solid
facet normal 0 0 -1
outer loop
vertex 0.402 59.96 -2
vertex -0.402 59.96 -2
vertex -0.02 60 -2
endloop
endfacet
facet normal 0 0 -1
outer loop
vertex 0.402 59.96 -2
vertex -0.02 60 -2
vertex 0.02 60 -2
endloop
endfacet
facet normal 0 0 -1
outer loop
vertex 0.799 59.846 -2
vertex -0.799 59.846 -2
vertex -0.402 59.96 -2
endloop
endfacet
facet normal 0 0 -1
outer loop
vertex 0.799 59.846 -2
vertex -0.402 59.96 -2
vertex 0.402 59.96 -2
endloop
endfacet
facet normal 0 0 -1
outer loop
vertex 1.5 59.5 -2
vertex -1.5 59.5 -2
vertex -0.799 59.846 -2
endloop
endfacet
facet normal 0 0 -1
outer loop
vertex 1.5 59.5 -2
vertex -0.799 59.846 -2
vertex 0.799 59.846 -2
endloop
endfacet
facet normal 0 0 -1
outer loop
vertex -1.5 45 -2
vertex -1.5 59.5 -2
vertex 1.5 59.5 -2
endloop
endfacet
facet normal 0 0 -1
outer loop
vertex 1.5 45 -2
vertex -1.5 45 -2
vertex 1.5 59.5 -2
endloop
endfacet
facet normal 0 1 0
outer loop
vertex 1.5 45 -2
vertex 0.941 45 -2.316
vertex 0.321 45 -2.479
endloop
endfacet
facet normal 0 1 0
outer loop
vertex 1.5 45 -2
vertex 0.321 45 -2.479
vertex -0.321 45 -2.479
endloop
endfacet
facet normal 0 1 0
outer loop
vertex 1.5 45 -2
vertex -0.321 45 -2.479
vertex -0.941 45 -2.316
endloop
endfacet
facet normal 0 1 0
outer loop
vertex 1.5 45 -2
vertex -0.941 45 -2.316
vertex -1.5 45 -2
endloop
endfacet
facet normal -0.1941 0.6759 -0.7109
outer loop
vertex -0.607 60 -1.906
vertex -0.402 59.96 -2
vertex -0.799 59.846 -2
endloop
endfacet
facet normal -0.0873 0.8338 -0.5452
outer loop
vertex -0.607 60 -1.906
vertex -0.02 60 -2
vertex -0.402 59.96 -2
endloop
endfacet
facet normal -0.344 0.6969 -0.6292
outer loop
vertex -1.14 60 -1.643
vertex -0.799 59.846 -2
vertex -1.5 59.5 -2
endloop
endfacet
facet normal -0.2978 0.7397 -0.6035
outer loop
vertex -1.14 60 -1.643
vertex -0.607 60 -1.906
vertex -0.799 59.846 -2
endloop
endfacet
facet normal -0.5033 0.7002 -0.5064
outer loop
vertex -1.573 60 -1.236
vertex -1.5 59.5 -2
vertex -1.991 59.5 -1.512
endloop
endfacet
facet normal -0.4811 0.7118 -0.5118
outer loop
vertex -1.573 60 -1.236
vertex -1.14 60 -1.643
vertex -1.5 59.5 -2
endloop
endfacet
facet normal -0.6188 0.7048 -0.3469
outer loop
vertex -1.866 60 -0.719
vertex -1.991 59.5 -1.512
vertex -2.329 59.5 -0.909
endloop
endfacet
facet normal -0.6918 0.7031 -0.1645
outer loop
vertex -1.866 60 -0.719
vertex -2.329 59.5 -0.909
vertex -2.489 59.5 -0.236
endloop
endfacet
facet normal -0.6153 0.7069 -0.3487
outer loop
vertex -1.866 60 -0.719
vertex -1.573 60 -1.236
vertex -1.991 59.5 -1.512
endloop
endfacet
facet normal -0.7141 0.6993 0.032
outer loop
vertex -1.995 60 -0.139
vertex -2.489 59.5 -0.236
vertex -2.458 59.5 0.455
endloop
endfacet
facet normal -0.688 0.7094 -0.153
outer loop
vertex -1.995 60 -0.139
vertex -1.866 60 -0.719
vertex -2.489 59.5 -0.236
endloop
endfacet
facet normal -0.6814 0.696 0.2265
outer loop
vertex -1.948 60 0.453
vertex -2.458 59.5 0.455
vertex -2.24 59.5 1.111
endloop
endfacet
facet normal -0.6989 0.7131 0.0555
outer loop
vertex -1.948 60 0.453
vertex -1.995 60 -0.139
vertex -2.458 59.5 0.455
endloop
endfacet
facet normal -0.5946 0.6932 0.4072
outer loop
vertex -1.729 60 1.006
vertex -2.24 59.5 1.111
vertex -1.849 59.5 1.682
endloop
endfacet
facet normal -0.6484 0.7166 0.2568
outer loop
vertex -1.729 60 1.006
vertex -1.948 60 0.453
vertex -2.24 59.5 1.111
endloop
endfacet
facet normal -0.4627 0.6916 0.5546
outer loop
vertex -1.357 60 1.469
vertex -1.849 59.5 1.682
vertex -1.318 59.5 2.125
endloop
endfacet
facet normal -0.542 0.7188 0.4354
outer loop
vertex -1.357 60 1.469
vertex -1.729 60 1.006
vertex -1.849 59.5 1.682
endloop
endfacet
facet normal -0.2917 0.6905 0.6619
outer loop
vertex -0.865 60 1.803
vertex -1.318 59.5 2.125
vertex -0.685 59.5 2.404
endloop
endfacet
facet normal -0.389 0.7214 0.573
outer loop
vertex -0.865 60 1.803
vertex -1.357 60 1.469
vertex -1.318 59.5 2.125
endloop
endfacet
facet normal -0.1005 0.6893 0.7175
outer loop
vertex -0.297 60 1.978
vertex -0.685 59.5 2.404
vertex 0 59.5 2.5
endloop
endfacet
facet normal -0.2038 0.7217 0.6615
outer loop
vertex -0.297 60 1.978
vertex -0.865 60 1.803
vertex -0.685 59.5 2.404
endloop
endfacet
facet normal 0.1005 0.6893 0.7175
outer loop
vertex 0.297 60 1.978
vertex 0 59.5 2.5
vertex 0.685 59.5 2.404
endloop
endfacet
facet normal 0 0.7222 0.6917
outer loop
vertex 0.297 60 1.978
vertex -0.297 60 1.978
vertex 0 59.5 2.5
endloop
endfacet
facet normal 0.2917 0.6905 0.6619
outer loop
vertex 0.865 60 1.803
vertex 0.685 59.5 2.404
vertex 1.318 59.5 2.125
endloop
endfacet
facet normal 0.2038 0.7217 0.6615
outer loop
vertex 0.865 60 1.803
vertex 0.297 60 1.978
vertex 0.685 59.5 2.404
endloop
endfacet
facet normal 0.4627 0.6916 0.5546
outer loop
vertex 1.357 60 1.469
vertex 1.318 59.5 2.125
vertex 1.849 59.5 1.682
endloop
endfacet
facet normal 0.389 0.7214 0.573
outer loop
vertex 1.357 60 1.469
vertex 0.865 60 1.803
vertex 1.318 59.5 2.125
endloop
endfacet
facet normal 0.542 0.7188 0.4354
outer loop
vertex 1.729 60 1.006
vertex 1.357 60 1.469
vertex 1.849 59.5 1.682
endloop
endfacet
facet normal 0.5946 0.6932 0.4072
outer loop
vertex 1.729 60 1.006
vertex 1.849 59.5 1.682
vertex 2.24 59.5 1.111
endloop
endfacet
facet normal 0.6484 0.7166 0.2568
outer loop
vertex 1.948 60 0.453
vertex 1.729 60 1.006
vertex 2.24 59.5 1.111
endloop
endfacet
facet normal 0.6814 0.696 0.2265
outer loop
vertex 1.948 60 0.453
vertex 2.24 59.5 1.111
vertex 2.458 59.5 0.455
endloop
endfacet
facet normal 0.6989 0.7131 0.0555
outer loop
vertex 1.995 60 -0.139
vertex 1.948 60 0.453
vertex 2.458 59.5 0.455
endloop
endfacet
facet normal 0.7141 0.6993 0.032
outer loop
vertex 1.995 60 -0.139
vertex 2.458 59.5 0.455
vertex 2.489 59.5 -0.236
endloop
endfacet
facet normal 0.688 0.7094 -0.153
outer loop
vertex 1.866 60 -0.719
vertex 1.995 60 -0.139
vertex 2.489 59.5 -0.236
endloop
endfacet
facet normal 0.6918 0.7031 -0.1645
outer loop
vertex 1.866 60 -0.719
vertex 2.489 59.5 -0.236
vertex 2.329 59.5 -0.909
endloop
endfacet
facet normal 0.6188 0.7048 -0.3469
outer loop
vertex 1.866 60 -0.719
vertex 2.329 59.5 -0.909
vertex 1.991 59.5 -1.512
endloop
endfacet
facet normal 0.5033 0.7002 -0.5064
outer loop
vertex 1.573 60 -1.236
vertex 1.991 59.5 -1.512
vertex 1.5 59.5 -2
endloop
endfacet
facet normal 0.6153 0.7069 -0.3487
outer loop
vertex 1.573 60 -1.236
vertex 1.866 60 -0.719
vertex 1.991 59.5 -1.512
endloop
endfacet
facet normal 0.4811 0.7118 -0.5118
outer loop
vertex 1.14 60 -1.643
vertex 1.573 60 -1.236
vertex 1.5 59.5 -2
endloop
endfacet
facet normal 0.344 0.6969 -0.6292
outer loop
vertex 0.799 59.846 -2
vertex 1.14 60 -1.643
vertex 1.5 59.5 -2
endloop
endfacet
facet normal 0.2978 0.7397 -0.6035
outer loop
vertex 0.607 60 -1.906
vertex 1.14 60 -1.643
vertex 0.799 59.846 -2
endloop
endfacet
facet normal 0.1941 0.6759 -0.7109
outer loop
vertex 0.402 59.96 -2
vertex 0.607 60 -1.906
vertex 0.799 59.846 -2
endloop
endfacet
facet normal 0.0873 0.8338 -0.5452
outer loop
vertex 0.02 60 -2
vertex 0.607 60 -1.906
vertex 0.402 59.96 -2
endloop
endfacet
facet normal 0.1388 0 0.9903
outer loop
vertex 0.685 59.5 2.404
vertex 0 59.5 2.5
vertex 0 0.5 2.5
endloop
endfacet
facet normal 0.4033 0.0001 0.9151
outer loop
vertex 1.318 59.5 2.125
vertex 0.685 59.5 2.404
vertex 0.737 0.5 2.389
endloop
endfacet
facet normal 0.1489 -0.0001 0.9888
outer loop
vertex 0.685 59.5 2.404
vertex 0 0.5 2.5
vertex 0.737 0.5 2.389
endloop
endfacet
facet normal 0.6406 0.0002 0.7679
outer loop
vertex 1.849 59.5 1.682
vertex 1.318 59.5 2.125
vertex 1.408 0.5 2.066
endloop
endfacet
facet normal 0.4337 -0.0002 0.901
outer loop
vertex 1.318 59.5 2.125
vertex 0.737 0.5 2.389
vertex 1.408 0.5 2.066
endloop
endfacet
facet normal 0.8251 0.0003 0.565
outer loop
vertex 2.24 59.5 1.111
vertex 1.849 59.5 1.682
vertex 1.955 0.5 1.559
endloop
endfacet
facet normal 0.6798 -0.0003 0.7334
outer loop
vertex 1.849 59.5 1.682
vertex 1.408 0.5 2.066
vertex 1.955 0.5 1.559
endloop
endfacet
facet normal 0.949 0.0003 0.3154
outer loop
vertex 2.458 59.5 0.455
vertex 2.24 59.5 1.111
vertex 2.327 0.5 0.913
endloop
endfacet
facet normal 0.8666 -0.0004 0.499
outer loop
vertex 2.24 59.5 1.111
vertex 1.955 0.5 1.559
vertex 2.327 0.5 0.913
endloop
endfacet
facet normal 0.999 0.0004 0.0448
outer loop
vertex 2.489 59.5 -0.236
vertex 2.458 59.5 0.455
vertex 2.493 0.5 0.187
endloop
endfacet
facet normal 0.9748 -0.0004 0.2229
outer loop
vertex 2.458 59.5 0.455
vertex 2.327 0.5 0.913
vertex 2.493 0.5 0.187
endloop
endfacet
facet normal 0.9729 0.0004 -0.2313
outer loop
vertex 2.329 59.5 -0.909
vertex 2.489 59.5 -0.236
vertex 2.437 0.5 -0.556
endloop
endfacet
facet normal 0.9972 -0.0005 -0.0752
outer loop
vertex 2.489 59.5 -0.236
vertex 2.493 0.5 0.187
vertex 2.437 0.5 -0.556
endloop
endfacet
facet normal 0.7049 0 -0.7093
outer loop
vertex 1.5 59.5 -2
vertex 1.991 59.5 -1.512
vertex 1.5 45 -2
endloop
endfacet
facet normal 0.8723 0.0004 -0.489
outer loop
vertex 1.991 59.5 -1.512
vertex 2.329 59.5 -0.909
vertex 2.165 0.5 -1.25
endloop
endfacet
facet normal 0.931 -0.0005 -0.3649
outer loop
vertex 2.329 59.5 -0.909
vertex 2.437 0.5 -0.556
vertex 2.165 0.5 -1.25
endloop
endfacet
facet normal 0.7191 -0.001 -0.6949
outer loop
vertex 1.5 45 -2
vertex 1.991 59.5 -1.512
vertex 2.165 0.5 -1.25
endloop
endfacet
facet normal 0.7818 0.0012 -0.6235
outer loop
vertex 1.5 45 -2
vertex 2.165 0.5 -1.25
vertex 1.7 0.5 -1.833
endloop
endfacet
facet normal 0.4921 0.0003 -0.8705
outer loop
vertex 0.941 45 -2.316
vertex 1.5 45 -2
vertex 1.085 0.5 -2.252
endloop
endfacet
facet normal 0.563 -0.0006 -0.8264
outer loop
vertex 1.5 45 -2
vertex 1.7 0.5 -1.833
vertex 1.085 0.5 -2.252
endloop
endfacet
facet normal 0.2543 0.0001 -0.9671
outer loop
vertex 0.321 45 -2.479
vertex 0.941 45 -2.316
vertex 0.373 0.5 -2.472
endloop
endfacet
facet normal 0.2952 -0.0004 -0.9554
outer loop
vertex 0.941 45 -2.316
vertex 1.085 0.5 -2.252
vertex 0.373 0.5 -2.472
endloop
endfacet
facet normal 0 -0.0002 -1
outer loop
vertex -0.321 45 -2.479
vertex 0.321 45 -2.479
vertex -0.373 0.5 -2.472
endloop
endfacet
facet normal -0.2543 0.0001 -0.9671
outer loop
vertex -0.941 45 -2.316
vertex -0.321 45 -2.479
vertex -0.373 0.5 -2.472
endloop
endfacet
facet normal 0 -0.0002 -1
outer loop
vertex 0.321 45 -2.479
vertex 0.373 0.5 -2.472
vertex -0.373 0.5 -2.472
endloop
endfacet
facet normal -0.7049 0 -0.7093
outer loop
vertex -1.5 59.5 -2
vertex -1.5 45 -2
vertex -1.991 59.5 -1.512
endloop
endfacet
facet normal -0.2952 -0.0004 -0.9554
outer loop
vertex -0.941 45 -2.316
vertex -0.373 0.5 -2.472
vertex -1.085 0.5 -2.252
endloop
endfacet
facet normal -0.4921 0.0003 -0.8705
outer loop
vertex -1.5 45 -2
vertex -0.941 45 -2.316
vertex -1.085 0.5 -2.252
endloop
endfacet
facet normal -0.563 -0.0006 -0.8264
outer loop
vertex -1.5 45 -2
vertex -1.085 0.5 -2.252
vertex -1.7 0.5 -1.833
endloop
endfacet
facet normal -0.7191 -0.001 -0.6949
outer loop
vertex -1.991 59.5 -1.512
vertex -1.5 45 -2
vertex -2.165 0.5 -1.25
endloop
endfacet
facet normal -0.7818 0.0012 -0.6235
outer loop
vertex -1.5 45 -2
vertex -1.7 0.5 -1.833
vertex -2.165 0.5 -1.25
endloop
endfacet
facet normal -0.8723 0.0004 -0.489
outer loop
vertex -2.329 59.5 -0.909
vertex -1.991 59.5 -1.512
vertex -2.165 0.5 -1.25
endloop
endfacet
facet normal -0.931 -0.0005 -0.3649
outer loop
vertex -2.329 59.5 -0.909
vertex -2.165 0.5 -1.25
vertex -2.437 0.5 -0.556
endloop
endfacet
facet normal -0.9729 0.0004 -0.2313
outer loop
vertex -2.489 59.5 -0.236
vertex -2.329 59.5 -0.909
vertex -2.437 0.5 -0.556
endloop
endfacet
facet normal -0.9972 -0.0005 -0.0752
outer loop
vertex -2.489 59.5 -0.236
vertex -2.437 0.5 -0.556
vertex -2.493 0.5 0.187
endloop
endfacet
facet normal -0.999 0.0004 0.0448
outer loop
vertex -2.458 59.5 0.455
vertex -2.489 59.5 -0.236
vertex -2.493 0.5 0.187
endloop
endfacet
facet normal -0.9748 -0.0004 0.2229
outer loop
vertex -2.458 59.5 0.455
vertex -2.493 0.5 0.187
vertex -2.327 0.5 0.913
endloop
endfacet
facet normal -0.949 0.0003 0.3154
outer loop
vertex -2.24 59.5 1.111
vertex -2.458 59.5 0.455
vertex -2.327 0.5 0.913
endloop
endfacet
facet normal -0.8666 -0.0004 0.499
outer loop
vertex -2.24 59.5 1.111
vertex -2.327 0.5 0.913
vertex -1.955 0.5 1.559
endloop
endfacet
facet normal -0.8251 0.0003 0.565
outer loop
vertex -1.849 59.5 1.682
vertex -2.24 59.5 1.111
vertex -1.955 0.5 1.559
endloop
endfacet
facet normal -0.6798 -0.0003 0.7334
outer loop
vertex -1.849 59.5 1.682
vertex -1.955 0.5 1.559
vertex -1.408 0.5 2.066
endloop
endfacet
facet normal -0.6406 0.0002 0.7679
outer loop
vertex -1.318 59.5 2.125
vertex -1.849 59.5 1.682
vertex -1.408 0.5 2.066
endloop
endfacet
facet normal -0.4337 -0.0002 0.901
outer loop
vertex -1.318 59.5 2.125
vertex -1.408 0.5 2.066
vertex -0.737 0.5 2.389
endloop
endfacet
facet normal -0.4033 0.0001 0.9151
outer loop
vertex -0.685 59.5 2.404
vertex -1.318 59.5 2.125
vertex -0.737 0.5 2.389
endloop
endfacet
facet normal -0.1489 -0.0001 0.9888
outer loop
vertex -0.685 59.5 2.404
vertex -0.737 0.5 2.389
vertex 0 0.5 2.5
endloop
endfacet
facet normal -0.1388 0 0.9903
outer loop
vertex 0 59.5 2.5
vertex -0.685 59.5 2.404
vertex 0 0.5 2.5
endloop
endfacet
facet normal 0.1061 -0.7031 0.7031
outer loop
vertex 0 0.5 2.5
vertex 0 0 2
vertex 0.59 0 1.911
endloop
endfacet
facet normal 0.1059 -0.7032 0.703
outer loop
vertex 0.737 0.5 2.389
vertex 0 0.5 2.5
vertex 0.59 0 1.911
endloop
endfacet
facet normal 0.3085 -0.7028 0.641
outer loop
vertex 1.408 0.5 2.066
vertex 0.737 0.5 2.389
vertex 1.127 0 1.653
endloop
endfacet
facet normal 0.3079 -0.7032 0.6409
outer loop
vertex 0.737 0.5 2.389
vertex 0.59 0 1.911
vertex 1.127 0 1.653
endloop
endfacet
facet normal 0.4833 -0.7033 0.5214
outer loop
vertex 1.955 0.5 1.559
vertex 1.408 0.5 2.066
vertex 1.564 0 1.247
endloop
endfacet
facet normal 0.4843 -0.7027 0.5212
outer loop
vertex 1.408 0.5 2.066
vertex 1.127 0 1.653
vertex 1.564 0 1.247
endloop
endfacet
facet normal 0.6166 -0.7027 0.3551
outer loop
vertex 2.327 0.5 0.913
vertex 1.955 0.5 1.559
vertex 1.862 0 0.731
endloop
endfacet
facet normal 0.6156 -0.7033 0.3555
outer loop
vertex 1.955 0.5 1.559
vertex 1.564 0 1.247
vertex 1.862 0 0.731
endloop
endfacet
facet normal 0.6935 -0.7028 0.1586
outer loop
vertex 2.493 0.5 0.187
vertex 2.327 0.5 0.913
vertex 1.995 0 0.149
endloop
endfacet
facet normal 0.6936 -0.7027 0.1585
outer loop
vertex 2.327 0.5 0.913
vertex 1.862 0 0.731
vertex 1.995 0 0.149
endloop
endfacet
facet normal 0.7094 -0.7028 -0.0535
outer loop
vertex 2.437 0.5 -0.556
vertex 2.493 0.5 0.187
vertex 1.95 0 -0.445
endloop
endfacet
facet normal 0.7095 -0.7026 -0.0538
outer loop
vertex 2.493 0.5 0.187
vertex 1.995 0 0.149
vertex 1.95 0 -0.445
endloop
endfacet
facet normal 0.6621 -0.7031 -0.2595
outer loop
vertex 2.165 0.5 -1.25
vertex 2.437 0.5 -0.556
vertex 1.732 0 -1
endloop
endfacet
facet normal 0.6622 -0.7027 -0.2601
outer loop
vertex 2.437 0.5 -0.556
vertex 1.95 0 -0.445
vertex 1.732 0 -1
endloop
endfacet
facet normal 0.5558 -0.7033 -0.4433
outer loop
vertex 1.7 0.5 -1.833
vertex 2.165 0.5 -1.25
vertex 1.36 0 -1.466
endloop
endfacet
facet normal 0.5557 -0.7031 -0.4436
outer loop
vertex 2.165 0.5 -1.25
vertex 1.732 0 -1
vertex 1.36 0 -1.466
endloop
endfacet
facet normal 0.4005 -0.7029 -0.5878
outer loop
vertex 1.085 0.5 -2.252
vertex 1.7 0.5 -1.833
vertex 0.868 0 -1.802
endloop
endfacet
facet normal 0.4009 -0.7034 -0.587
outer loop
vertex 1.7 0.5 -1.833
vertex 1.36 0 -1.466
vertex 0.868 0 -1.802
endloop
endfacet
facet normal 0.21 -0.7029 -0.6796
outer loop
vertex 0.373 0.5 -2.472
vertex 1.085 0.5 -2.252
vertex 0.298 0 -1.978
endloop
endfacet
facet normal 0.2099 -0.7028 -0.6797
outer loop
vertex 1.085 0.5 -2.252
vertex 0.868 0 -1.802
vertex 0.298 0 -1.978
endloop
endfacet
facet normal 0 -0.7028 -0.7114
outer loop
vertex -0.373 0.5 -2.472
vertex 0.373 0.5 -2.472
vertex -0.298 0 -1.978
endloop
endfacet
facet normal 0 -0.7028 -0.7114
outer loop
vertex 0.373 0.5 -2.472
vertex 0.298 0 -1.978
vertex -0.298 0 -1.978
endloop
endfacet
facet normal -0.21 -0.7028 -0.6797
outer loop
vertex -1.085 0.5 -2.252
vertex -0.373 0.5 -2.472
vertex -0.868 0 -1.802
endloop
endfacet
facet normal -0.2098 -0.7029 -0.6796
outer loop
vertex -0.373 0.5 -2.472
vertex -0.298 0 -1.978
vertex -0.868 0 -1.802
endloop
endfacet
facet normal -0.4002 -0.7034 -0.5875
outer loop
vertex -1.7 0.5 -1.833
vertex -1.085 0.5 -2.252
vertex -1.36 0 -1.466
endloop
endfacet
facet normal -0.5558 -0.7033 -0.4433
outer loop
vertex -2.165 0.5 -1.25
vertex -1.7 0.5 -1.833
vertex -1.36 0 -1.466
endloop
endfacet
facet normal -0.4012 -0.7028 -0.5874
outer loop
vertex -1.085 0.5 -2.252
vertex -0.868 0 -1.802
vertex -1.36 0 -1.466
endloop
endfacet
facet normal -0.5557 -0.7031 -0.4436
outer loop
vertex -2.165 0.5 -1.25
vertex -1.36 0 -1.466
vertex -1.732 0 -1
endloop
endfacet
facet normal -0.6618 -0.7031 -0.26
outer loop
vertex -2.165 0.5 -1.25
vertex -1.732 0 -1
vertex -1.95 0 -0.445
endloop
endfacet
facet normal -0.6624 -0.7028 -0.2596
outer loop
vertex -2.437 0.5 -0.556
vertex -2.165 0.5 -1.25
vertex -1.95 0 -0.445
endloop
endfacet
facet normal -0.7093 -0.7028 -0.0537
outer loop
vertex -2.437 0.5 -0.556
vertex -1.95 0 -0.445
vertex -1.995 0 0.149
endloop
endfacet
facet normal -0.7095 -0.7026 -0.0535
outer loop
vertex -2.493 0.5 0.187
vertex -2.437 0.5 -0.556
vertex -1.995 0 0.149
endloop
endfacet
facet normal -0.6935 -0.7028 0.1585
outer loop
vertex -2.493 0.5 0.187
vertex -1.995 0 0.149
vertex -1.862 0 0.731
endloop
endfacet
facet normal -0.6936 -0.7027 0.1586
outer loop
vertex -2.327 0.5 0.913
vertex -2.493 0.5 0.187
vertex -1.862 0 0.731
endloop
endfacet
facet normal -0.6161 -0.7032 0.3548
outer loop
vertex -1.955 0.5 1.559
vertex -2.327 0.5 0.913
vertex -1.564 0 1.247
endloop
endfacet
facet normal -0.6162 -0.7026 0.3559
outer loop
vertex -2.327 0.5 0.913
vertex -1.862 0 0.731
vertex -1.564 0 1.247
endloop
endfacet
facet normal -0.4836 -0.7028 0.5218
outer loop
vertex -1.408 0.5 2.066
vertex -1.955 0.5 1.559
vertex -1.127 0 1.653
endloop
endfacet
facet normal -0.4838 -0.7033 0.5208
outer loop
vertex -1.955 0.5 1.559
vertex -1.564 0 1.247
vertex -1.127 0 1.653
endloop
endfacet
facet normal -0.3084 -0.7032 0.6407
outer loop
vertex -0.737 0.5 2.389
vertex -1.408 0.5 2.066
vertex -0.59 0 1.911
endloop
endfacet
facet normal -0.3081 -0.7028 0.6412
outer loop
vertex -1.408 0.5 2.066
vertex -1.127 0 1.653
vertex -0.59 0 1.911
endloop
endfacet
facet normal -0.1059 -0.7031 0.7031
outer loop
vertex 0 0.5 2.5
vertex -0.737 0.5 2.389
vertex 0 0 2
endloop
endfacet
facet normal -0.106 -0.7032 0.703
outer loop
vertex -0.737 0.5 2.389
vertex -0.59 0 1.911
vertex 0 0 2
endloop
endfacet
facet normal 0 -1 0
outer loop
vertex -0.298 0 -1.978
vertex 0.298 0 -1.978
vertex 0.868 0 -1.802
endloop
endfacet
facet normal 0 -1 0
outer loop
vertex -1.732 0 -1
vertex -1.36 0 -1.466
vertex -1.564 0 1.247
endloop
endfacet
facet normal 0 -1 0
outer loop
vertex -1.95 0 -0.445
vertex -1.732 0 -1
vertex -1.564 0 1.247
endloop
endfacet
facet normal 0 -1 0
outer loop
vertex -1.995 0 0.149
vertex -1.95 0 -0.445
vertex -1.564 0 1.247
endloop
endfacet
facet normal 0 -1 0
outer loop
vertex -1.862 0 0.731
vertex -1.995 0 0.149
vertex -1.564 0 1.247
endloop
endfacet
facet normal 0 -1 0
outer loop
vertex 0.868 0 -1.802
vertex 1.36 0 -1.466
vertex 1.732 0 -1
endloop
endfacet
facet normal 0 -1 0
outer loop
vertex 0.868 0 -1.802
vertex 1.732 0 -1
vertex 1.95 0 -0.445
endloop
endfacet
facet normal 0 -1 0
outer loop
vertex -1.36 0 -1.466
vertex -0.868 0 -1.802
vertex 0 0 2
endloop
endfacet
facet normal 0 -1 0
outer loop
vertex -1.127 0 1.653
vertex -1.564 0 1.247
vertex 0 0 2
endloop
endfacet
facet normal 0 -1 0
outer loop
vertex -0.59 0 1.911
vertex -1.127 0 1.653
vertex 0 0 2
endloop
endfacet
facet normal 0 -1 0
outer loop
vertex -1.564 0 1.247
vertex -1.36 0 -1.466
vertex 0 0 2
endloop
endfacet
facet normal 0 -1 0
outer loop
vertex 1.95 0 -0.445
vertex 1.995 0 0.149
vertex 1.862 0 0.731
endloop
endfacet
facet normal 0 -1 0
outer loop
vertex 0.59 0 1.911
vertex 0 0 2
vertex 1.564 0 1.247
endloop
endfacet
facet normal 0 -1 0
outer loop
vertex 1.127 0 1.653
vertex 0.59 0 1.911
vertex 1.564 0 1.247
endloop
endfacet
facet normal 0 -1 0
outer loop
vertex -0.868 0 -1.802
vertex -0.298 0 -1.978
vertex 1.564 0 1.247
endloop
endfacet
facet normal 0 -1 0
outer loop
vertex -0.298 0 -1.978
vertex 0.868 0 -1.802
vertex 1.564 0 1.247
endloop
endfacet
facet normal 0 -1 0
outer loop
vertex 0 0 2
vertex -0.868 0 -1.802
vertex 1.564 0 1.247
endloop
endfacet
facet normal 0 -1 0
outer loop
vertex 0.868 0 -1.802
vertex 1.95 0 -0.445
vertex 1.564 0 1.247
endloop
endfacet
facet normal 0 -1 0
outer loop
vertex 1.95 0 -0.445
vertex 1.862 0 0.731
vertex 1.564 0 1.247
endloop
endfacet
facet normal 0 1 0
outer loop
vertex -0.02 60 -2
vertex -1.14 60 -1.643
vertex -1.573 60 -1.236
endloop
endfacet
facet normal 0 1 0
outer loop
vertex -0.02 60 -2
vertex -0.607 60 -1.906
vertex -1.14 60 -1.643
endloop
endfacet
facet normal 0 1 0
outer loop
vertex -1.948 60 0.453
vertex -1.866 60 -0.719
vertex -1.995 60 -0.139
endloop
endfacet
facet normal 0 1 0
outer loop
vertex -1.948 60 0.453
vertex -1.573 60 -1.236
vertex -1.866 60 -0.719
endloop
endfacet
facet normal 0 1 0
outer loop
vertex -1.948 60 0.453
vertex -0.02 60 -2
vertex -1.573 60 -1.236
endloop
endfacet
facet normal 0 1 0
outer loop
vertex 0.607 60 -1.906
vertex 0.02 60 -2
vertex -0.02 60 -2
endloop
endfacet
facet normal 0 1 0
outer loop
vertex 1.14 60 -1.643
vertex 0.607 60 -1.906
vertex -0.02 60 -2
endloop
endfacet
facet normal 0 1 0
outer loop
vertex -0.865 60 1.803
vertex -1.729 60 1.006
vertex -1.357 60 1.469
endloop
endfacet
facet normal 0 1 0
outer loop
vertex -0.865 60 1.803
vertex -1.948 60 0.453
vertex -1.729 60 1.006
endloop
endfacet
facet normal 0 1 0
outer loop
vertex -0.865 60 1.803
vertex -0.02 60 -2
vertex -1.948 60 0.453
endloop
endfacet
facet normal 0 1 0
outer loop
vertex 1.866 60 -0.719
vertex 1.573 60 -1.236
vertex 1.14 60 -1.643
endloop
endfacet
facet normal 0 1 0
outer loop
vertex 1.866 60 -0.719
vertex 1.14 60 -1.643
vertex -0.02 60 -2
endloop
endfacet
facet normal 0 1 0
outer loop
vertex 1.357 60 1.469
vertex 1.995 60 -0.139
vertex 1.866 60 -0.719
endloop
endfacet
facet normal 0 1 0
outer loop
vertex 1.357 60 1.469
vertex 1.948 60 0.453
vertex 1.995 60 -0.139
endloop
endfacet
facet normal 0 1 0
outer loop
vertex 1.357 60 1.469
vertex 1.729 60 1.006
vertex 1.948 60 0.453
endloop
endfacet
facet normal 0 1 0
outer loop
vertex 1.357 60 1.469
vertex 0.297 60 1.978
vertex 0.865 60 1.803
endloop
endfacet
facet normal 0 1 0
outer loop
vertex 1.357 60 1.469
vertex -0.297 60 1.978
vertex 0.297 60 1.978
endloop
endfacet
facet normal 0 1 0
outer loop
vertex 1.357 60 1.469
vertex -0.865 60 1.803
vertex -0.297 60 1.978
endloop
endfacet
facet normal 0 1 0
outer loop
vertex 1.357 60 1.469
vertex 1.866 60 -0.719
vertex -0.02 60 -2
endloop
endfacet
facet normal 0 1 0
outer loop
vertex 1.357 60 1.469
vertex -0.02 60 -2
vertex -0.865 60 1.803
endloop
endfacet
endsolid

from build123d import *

# Parameters (mm, degrees)
SKETCH_1_R          = 2.5
EXTRUDE_1_DEPTH     = 60
CUT_EXTRUDE_START   = -15
CUT_EXTRUDE_1_DEPTH = 15
CHAMFER_1_SIZE      = 0.5


with BuildPart() as part:
    # Эскиз1 → Бобышка-Вытянуть1 (new body)
    with BuildSketch(Plane(origin=(0, 0, 0), x_dir=(1, 0, 0), z_dir=(0, 1, 0))):
        with Locations(Location((0, 0, 0), (0, 0, 270))):
            Circle(SKETCH_1_R)
    extrude(amount=EXTRUDE_1_DEPTH)

    # Эскиз2 → Вырез-Вытянуть1 (cut)
    with BuildSketch(Plane(origin=(0, 60, 0), x_dir=(1, 0, 0), z_dir=(0, 1, 0)).offset(CUT_EXTRUDE_START)):
        with BuildLine():
            Line((-1.5, 2), (1.5, 2))
            ThreePointArc((1.5, 2), (0, 2.5), (-1.5, 2))
        make_face()
    extrude(amount=CUT_EXTRUDE_1_DEPTH, mode=Mode.SUBTRACT)

    # Фаска1
    chamfer_1_edges = [part.edges().sort_by_distance(p)[0] for p in [
        (-2.371708245, 60, 0.790569415),
        (0, 0, -2.5),
    ]]
    chamfer(chamfer_1_edges, length=CHAMFER_1_SIZE - 0.0001)  # a hair under: the kernel refuses the full size


solid = part.part
